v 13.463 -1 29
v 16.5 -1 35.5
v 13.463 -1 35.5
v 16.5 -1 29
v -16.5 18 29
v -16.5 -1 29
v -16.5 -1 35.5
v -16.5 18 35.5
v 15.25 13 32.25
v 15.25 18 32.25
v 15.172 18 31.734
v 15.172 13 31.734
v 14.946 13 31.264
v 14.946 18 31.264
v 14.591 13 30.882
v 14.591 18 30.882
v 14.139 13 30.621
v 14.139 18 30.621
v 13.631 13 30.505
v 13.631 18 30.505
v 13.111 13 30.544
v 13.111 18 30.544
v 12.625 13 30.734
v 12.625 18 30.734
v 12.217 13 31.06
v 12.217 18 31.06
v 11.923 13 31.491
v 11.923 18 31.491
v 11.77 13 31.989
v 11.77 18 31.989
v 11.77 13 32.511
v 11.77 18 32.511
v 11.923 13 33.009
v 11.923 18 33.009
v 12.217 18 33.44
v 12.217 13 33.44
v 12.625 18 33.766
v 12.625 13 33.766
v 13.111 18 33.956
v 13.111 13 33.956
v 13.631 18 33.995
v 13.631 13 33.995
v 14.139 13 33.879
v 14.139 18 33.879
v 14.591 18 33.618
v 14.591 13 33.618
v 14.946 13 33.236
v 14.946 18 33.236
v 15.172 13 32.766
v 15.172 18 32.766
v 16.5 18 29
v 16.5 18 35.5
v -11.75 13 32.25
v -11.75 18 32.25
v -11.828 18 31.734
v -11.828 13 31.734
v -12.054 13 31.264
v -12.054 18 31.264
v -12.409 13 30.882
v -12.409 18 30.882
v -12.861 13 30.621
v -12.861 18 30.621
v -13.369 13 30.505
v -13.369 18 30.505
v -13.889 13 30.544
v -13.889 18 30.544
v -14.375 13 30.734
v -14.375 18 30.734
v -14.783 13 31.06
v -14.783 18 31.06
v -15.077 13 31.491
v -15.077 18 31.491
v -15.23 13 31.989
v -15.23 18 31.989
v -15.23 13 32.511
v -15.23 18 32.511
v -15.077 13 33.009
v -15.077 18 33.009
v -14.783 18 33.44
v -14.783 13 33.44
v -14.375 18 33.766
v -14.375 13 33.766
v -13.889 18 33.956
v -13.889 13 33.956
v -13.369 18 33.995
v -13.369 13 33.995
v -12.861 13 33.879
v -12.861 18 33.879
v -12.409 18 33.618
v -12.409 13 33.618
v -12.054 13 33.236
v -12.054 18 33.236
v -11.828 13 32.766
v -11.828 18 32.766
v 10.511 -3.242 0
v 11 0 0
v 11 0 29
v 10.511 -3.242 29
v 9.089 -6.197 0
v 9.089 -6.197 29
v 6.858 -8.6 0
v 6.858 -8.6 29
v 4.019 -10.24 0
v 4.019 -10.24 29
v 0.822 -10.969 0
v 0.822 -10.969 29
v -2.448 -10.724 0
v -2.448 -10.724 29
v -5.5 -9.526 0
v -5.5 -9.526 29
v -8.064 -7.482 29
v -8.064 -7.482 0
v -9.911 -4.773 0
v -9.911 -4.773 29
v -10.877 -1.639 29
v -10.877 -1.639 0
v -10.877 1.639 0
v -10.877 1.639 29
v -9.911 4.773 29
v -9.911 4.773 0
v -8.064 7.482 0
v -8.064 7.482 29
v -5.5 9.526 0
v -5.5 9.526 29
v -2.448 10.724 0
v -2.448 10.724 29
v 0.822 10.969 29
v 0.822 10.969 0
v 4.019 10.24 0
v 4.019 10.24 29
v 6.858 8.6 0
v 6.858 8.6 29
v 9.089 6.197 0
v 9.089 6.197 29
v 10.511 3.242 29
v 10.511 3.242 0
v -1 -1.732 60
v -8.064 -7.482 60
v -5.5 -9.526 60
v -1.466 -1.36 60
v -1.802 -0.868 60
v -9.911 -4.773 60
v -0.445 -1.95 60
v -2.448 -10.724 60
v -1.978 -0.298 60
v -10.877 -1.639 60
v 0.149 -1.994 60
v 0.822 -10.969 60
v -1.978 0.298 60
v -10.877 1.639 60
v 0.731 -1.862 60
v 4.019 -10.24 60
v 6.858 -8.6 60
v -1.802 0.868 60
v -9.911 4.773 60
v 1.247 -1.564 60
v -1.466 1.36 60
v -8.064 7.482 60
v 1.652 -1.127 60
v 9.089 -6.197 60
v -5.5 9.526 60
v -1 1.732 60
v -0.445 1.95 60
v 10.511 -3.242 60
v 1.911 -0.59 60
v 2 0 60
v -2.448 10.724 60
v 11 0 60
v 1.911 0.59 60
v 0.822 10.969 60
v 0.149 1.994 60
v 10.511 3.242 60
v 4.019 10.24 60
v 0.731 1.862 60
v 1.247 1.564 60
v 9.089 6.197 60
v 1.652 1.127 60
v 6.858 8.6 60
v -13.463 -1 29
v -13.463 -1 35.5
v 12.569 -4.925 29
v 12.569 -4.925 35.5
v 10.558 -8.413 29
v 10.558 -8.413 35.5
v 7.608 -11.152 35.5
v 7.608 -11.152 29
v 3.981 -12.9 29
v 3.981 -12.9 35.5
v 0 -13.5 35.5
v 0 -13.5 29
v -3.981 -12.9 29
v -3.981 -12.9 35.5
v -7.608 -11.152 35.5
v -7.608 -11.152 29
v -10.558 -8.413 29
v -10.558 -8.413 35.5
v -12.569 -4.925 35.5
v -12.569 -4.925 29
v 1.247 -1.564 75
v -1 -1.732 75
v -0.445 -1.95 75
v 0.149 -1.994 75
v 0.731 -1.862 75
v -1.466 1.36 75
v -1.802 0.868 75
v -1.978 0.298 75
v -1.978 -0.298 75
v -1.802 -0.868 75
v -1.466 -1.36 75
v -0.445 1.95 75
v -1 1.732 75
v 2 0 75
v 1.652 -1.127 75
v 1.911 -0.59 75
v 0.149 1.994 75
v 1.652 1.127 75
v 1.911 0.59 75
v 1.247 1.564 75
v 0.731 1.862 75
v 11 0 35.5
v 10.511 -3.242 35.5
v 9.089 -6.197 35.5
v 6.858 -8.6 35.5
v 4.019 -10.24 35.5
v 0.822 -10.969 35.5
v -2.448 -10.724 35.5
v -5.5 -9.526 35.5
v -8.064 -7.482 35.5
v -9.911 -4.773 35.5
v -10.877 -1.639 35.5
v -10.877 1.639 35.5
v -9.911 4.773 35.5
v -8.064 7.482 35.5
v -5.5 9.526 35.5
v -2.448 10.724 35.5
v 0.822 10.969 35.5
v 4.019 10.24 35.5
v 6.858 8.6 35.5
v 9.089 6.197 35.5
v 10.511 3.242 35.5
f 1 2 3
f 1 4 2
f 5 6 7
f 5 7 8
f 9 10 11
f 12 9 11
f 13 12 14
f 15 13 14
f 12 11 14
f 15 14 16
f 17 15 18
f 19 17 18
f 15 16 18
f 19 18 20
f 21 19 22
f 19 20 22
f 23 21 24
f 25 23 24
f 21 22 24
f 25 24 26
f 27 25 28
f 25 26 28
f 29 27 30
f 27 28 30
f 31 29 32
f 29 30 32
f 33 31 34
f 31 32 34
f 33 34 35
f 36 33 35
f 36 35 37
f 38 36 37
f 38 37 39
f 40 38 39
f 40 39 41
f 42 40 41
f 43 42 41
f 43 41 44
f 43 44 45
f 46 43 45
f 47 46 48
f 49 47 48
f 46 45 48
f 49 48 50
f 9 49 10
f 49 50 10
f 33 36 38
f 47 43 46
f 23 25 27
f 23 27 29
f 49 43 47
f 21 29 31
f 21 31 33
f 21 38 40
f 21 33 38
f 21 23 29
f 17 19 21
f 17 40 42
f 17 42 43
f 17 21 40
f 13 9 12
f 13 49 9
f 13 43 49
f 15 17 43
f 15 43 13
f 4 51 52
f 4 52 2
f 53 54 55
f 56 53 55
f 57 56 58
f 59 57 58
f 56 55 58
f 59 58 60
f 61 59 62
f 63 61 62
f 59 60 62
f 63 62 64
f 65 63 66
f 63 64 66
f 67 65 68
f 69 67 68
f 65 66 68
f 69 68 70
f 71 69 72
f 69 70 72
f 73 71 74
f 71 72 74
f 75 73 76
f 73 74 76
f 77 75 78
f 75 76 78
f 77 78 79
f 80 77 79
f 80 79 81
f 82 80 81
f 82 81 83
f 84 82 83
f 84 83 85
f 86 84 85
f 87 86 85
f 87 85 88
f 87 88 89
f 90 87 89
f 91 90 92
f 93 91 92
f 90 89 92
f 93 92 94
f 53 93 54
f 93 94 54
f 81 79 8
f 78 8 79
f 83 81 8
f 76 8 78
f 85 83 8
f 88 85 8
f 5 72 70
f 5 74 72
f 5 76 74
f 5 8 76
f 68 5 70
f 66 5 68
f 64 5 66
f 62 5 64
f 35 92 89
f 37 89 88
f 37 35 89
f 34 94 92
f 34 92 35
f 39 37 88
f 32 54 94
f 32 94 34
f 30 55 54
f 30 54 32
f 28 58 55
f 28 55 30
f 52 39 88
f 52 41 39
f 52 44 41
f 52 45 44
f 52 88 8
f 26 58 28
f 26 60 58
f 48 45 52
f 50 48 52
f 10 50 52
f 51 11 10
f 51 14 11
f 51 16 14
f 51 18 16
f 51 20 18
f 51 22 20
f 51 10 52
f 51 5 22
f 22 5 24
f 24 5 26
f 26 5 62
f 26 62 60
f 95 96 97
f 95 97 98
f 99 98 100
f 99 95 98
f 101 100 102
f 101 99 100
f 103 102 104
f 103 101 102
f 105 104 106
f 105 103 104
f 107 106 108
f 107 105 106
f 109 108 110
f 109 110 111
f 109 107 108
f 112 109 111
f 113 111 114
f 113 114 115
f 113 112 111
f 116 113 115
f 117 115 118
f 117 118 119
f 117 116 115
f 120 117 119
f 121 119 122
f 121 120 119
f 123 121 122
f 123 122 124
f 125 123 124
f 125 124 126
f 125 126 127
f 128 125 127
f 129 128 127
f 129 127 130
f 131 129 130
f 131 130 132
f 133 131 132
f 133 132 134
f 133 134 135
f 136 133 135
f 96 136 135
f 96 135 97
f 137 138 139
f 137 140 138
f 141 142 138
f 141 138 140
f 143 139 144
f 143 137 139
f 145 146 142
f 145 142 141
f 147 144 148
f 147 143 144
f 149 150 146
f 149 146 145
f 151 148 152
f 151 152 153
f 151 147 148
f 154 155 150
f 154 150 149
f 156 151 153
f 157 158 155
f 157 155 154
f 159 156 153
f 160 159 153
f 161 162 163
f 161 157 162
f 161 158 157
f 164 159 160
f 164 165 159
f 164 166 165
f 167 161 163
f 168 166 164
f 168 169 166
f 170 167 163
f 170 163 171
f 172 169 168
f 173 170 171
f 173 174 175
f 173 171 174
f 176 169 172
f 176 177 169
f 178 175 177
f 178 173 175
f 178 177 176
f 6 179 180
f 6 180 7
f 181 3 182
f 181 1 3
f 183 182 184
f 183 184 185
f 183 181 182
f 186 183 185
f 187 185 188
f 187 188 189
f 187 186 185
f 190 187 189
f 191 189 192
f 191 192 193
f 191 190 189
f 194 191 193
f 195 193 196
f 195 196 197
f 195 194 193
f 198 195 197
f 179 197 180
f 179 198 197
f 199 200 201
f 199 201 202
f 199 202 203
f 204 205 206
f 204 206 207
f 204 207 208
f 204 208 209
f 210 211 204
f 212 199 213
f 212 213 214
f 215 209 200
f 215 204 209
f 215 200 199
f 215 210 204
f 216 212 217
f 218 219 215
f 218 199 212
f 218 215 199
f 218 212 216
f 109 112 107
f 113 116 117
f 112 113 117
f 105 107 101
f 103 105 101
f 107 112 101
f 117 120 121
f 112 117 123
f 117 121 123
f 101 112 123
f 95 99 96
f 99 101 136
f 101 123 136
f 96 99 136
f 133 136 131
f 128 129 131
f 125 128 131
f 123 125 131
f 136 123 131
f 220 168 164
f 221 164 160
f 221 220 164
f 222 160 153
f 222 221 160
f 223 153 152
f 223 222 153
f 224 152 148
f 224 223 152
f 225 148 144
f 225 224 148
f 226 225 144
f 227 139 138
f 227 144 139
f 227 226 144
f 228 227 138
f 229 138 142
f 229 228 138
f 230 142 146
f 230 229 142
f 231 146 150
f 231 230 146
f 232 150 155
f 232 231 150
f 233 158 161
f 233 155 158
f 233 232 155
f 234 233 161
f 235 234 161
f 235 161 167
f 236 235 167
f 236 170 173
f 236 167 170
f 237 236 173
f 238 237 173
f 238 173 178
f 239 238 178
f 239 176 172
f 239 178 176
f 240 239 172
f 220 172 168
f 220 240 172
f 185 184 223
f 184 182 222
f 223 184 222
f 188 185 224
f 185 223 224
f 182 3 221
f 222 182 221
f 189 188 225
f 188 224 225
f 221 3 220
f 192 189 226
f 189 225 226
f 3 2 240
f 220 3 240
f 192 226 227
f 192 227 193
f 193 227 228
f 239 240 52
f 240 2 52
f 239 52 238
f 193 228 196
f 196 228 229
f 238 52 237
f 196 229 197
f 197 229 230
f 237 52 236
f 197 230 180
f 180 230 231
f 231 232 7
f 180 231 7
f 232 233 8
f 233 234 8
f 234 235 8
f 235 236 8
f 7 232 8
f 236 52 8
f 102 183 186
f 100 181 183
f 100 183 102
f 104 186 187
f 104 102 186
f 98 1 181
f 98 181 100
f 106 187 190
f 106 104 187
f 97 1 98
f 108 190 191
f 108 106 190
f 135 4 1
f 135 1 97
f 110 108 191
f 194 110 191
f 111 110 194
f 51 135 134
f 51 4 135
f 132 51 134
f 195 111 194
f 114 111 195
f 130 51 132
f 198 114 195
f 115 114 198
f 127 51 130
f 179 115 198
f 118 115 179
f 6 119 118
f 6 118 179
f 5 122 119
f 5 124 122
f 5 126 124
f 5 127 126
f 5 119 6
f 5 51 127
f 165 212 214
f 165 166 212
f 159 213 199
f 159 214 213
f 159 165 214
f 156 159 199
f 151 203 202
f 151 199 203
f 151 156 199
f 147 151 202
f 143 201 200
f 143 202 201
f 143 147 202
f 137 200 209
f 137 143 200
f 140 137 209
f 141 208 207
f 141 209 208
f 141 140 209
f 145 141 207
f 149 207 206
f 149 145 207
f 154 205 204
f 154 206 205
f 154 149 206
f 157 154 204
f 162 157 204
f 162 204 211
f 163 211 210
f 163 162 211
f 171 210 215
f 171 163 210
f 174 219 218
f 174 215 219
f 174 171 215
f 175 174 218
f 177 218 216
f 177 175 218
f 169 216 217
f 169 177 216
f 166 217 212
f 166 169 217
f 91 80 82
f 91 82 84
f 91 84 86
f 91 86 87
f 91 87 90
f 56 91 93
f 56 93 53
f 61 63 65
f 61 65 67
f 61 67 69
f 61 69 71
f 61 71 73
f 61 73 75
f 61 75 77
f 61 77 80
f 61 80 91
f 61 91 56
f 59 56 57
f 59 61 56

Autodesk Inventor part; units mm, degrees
ref_plane "YZ Plane" through (0, 0, 0) normal (1, 0, 0) x (0, 1, 0)
ref_plane "XZ Plane" through (0, 0, 0) normal (0, 1, 0) x (-1, 0, 0)
sketch "Sketch1" plane through (0, 0, 0) normal (0, 0, 1) x (1, 0, 0)
  circle A0 centre (0, 0) radius 11
  dimension "d0" = 22
extrude "Extrusion1" add sketch "Sketch1" along normal blind 60
sketch "Sketch2" plane through (0, 0, 60) normal (0, 0, 1) x (1, 0, 0)
  circle A0 centre (0, 0) radius 2
  dimension "d3" = 4
extrude "Extrusion2" add sketch "Sketch2" along normal blind 15
ref_plane "Work Plane1" through (0, 0, 29) normal (0, 0, -1) x (-1, 0, 0)
sketch "Sketch3" plane through (0, 0, 29) normal (0, 0, -1) x (-1, 0, 0)
  line L0 (16.5, -18) -> (-16.5, -18) construction
  line L1 (-16.5, -18) -> (-16.5, 18) construction
  line L2 (-16.5, 18) -> (16.5, 18) construction
  line L3 (16.5, 18) -> (16.5, -18) construction
  line L4 (16.5, -18) -> (-16.5, 18) construction
  line L5 (-16.5, -18) -> (16.5, 18) construction
  arc A0 (-13.4629, -1) -> (13.4629, -1) centre (0, 0) ccw construction
  circle A1 centre (0, 0) radius 13.5
  line L6 (16.5, 18) -> (-16.5, 18)
  line L7 (-16.5, 18) -> (-16.5, -1)
  line L8 (-16.5, -1) -> (16.5, -1)
  line L9 (16.5, -1) -> (16.5, 18)
  dimension "d7" = 33
  dimension "d8" = 36
  dimension "d9" = 27
  dimension "d10" = 27
  dimension "d11" = 19
extrude "Extrusion3" add sketch "Sketch3" against normal blind 6.5
sketch "Sketch4" plane through (-16.5, 18, 29) normal (0, 1, 0) x (1, 0, 0)
  line L0 (3.0371, 0) -> (0, 0) construction
  line L1 (0, 0) -> (33, 0) construction
  line L2 (33, 0) -> (33, -3.25) construction
  line L3 (33, -3.25) -> (0, -3.25) construction
  line L4 (0, -3.25) -> (0, 0) construction
  line L5 (0, -3.25) -> (3, -3.25) construction
  line L6 (33, -3.25) -> (30, -3.25) construction
  circle A0 centre (3, -3.25) radius 1.75
  circle A1 centre (30, -3.25) radius 1.75
  point P0 (16.5, 29)
  dimension "d14" = 33
  dimension "d15" = 3.25
  dimension "d16" = 3
  dimension "d17" = 3
  dimension "d18" = 3.5
  dimension "d19" = 3.5
extrude "Extrusion4" cut sketch "Sketch4" against normal blind 5
properties part number "Small Motor"
